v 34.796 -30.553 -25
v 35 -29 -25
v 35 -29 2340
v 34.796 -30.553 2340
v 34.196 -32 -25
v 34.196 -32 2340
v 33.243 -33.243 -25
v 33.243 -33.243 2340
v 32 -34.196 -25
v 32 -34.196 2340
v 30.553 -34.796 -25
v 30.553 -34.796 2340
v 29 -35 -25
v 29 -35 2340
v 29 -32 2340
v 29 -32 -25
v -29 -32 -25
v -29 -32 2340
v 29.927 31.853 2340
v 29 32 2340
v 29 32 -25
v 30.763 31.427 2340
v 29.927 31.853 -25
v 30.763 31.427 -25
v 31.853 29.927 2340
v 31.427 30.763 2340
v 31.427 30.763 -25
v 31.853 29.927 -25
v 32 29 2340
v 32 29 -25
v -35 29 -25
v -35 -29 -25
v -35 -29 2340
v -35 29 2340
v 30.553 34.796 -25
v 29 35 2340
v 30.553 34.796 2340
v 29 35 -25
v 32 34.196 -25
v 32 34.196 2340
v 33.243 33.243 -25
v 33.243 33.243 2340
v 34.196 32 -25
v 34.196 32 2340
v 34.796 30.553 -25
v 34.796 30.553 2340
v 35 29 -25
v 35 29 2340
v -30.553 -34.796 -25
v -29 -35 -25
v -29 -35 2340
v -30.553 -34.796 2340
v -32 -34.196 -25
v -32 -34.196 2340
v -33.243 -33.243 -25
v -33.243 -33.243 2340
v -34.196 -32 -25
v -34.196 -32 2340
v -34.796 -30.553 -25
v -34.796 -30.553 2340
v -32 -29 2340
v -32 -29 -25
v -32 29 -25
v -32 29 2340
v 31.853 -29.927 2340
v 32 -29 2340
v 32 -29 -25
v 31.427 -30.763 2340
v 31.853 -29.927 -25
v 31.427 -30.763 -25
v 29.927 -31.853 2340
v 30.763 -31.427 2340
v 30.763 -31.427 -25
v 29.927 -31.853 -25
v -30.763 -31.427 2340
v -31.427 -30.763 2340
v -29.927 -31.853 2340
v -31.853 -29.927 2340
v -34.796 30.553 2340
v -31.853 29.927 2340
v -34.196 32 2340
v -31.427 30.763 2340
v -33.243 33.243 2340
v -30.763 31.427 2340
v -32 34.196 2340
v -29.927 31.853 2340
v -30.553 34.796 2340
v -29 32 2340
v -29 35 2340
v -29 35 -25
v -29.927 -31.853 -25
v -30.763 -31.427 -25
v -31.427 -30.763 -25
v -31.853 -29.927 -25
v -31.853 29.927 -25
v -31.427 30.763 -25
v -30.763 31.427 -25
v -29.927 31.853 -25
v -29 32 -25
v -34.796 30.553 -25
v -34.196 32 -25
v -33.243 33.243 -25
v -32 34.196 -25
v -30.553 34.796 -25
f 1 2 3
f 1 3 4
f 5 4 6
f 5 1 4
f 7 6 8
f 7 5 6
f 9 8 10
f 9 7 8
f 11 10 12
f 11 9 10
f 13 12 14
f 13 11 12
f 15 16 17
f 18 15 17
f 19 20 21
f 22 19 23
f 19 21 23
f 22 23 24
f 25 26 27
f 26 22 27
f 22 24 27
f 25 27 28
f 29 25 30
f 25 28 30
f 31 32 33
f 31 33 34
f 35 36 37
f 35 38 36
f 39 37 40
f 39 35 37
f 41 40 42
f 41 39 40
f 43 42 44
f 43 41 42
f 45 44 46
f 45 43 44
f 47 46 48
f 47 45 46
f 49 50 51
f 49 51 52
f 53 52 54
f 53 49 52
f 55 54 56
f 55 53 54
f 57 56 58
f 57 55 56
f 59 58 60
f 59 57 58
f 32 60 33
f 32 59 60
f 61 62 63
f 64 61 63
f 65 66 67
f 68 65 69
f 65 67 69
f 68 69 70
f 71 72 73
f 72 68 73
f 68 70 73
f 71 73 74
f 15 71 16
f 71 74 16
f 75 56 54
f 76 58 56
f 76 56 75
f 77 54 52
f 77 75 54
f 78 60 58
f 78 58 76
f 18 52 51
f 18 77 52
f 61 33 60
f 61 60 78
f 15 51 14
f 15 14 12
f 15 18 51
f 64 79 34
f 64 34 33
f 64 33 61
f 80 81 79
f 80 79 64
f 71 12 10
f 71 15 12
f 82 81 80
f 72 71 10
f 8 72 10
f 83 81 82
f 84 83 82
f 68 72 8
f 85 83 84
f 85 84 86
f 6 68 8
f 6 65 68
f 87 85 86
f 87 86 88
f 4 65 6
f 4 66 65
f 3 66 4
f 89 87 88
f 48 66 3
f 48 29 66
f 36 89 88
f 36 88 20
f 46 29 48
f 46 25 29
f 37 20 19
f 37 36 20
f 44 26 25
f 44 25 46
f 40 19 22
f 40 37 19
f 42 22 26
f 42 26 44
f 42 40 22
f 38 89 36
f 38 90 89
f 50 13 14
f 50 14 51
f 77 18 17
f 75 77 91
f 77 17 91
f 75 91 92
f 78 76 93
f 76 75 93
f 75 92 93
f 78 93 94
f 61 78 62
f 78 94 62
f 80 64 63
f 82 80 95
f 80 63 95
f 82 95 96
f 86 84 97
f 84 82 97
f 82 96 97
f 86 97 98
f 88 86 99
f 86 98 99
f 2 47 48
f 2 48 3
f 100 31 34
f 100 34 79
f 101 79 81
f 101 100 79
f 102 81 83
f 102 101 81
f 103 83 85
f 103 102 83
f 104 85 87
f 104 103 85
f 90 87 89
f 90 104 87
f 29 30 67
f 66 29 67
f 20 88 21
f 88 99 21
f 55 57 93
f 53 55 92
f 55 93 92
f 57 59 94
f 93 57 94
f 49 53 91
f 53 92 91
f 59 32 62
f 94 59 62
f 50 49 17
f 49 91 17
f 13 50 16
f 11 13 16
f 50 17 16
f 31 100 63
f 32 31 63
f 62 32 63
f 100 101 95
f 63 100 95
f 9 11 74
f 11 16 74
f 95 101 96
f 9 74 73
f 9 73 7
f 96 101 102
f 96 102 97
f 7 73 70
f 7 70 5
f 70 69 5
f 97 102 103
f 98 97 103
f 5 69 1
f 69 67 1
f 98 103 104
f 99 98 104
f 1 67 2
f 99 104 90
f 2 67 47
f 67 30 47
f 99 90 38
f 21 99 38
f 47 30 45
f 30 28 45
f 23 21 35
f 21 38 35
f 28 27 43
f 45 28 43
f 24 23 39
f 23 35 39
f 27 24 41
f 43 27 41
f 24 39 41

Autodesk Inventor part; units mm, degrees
ref_plane "Plano inicial" through (0, 0, -25) normal (0, 0, 1) x (1, 0, 0)
ref_plane "Plano final" through (0, 0, 2340) normal (0, 0, 1) x (1, 0, 0)
sketch "Boceto" plane through (0, 0, 0) normal (0, 0, 1) x (1, 0, 0)
  line L0 (-35, -29) -> (-35, 29)
  line L1 (-29, 35) -> (29, 35)
  line L2 (35, 29) -> (35, -29)
  line L3 (29, -35) -> (-29, -35)
  arc A0 (-35, -29) -> (-29, -35) centre (-29, -29) ccw
  arc A1 (35, 29) -> (29, 35) centre (29, 29) ccw
  arc A2 (-29, 35) -> (-35, 29) centre (-29, 29) ccw
  arc A3 (29, -35) -> (35, -29) centre (29, -29) ccw
  arc A4 (-29, 32) -> (-32, 29) centre (-29, 29) ccw
  line L4 (-29, 32) -> (29, 32)
  arc A5 (32, 29) -> (29, 32) centre (29, 29) ccw
  line L5 (32, 29) -> (32, -29)
  arc A6 (29, -32) -> (32, -29) centre (29, -29) ccw
  line L6 (29, -32) -> (-29, -32)
  arc A7 (-32, -29) -> (-29, -32) centre (-29, -29) ccw
  line L7 (-32, -29) -> (-32, 29)
  line L8 (0, 50.7397) -> (0, -50.7397) construction
  line L9 (-50.7397, 0) -> (50.7397, 0) construction
  dimension "d7" = 6
  dimension "d9" = 70
  dimension "d11" = 70
  dimension "d12" = 3
  dimension "d15" = 35
  dimension "d16" = 35
extrude "Cuerpo" add sketch "Boceto" along normal up to surface (2365 mm away) from surface at -25
sketch "Sketch3" plane through (0, 0, 0) normal (0, 0, 1) x (1, 0, 0)
  line L0 (0, 0) -> (10, 0)
ref_plane "Work Plane3" through (0, 0, 0) normal (0, -1, 0) x (1, 0, 0)
sketch "Sketch4" plane through (0, 0, 0) normal (0, -1, 0) x (1, 0, 0)
  line L0 (-2, -25) -> (12, -25)
  line L1 (-2, 2340) -> (12, 2340)
  dimension "d18" = 2365
ref_plane "Plano de trabajo4" through (0, -21, -25) normal (0, 0, -1) x (-1, 0, 0)
split "Dividir1" plane through (0, -21, -25) removes the side toward (0, 0, -1)
ref_plane "Plano de trabajo5" through (-500, -21, 2340) normal (0, 0, 1) x (1, 0, 0)
split "Dividir2" plane through (-500, -21, 2340) removes the side toward (0, 0, 1)
equation "\"d7\" = G_IR"
equation "\"d9\" = G_W"
equation "\"d11\" = G_H"
equation "\"d12\" = G_T"
equation "\"d15\" = 0.5 * d9"
equation "\"d16\" = 0.5 * d11"
equation "\"d3\" = G_L"
equation "\"G_W\" = 70"
equation "\"G_H\" = 70"
equation "\"G_T\" = 3"
equation "\"G_IR\" = 6"
equation "\"G_L\" = d18"
equation "\"G_OFFSET_START\" = 25"
equation "\"G_OFFSET_END\" = 25"
equation "\"d13\" = -G_OFFSET_START"
equation "\"B_L\" = 2315"
properties part number "ISO 10799-2 - 70x70x3 - 2365" material "Galvanizado catalogo 2"
